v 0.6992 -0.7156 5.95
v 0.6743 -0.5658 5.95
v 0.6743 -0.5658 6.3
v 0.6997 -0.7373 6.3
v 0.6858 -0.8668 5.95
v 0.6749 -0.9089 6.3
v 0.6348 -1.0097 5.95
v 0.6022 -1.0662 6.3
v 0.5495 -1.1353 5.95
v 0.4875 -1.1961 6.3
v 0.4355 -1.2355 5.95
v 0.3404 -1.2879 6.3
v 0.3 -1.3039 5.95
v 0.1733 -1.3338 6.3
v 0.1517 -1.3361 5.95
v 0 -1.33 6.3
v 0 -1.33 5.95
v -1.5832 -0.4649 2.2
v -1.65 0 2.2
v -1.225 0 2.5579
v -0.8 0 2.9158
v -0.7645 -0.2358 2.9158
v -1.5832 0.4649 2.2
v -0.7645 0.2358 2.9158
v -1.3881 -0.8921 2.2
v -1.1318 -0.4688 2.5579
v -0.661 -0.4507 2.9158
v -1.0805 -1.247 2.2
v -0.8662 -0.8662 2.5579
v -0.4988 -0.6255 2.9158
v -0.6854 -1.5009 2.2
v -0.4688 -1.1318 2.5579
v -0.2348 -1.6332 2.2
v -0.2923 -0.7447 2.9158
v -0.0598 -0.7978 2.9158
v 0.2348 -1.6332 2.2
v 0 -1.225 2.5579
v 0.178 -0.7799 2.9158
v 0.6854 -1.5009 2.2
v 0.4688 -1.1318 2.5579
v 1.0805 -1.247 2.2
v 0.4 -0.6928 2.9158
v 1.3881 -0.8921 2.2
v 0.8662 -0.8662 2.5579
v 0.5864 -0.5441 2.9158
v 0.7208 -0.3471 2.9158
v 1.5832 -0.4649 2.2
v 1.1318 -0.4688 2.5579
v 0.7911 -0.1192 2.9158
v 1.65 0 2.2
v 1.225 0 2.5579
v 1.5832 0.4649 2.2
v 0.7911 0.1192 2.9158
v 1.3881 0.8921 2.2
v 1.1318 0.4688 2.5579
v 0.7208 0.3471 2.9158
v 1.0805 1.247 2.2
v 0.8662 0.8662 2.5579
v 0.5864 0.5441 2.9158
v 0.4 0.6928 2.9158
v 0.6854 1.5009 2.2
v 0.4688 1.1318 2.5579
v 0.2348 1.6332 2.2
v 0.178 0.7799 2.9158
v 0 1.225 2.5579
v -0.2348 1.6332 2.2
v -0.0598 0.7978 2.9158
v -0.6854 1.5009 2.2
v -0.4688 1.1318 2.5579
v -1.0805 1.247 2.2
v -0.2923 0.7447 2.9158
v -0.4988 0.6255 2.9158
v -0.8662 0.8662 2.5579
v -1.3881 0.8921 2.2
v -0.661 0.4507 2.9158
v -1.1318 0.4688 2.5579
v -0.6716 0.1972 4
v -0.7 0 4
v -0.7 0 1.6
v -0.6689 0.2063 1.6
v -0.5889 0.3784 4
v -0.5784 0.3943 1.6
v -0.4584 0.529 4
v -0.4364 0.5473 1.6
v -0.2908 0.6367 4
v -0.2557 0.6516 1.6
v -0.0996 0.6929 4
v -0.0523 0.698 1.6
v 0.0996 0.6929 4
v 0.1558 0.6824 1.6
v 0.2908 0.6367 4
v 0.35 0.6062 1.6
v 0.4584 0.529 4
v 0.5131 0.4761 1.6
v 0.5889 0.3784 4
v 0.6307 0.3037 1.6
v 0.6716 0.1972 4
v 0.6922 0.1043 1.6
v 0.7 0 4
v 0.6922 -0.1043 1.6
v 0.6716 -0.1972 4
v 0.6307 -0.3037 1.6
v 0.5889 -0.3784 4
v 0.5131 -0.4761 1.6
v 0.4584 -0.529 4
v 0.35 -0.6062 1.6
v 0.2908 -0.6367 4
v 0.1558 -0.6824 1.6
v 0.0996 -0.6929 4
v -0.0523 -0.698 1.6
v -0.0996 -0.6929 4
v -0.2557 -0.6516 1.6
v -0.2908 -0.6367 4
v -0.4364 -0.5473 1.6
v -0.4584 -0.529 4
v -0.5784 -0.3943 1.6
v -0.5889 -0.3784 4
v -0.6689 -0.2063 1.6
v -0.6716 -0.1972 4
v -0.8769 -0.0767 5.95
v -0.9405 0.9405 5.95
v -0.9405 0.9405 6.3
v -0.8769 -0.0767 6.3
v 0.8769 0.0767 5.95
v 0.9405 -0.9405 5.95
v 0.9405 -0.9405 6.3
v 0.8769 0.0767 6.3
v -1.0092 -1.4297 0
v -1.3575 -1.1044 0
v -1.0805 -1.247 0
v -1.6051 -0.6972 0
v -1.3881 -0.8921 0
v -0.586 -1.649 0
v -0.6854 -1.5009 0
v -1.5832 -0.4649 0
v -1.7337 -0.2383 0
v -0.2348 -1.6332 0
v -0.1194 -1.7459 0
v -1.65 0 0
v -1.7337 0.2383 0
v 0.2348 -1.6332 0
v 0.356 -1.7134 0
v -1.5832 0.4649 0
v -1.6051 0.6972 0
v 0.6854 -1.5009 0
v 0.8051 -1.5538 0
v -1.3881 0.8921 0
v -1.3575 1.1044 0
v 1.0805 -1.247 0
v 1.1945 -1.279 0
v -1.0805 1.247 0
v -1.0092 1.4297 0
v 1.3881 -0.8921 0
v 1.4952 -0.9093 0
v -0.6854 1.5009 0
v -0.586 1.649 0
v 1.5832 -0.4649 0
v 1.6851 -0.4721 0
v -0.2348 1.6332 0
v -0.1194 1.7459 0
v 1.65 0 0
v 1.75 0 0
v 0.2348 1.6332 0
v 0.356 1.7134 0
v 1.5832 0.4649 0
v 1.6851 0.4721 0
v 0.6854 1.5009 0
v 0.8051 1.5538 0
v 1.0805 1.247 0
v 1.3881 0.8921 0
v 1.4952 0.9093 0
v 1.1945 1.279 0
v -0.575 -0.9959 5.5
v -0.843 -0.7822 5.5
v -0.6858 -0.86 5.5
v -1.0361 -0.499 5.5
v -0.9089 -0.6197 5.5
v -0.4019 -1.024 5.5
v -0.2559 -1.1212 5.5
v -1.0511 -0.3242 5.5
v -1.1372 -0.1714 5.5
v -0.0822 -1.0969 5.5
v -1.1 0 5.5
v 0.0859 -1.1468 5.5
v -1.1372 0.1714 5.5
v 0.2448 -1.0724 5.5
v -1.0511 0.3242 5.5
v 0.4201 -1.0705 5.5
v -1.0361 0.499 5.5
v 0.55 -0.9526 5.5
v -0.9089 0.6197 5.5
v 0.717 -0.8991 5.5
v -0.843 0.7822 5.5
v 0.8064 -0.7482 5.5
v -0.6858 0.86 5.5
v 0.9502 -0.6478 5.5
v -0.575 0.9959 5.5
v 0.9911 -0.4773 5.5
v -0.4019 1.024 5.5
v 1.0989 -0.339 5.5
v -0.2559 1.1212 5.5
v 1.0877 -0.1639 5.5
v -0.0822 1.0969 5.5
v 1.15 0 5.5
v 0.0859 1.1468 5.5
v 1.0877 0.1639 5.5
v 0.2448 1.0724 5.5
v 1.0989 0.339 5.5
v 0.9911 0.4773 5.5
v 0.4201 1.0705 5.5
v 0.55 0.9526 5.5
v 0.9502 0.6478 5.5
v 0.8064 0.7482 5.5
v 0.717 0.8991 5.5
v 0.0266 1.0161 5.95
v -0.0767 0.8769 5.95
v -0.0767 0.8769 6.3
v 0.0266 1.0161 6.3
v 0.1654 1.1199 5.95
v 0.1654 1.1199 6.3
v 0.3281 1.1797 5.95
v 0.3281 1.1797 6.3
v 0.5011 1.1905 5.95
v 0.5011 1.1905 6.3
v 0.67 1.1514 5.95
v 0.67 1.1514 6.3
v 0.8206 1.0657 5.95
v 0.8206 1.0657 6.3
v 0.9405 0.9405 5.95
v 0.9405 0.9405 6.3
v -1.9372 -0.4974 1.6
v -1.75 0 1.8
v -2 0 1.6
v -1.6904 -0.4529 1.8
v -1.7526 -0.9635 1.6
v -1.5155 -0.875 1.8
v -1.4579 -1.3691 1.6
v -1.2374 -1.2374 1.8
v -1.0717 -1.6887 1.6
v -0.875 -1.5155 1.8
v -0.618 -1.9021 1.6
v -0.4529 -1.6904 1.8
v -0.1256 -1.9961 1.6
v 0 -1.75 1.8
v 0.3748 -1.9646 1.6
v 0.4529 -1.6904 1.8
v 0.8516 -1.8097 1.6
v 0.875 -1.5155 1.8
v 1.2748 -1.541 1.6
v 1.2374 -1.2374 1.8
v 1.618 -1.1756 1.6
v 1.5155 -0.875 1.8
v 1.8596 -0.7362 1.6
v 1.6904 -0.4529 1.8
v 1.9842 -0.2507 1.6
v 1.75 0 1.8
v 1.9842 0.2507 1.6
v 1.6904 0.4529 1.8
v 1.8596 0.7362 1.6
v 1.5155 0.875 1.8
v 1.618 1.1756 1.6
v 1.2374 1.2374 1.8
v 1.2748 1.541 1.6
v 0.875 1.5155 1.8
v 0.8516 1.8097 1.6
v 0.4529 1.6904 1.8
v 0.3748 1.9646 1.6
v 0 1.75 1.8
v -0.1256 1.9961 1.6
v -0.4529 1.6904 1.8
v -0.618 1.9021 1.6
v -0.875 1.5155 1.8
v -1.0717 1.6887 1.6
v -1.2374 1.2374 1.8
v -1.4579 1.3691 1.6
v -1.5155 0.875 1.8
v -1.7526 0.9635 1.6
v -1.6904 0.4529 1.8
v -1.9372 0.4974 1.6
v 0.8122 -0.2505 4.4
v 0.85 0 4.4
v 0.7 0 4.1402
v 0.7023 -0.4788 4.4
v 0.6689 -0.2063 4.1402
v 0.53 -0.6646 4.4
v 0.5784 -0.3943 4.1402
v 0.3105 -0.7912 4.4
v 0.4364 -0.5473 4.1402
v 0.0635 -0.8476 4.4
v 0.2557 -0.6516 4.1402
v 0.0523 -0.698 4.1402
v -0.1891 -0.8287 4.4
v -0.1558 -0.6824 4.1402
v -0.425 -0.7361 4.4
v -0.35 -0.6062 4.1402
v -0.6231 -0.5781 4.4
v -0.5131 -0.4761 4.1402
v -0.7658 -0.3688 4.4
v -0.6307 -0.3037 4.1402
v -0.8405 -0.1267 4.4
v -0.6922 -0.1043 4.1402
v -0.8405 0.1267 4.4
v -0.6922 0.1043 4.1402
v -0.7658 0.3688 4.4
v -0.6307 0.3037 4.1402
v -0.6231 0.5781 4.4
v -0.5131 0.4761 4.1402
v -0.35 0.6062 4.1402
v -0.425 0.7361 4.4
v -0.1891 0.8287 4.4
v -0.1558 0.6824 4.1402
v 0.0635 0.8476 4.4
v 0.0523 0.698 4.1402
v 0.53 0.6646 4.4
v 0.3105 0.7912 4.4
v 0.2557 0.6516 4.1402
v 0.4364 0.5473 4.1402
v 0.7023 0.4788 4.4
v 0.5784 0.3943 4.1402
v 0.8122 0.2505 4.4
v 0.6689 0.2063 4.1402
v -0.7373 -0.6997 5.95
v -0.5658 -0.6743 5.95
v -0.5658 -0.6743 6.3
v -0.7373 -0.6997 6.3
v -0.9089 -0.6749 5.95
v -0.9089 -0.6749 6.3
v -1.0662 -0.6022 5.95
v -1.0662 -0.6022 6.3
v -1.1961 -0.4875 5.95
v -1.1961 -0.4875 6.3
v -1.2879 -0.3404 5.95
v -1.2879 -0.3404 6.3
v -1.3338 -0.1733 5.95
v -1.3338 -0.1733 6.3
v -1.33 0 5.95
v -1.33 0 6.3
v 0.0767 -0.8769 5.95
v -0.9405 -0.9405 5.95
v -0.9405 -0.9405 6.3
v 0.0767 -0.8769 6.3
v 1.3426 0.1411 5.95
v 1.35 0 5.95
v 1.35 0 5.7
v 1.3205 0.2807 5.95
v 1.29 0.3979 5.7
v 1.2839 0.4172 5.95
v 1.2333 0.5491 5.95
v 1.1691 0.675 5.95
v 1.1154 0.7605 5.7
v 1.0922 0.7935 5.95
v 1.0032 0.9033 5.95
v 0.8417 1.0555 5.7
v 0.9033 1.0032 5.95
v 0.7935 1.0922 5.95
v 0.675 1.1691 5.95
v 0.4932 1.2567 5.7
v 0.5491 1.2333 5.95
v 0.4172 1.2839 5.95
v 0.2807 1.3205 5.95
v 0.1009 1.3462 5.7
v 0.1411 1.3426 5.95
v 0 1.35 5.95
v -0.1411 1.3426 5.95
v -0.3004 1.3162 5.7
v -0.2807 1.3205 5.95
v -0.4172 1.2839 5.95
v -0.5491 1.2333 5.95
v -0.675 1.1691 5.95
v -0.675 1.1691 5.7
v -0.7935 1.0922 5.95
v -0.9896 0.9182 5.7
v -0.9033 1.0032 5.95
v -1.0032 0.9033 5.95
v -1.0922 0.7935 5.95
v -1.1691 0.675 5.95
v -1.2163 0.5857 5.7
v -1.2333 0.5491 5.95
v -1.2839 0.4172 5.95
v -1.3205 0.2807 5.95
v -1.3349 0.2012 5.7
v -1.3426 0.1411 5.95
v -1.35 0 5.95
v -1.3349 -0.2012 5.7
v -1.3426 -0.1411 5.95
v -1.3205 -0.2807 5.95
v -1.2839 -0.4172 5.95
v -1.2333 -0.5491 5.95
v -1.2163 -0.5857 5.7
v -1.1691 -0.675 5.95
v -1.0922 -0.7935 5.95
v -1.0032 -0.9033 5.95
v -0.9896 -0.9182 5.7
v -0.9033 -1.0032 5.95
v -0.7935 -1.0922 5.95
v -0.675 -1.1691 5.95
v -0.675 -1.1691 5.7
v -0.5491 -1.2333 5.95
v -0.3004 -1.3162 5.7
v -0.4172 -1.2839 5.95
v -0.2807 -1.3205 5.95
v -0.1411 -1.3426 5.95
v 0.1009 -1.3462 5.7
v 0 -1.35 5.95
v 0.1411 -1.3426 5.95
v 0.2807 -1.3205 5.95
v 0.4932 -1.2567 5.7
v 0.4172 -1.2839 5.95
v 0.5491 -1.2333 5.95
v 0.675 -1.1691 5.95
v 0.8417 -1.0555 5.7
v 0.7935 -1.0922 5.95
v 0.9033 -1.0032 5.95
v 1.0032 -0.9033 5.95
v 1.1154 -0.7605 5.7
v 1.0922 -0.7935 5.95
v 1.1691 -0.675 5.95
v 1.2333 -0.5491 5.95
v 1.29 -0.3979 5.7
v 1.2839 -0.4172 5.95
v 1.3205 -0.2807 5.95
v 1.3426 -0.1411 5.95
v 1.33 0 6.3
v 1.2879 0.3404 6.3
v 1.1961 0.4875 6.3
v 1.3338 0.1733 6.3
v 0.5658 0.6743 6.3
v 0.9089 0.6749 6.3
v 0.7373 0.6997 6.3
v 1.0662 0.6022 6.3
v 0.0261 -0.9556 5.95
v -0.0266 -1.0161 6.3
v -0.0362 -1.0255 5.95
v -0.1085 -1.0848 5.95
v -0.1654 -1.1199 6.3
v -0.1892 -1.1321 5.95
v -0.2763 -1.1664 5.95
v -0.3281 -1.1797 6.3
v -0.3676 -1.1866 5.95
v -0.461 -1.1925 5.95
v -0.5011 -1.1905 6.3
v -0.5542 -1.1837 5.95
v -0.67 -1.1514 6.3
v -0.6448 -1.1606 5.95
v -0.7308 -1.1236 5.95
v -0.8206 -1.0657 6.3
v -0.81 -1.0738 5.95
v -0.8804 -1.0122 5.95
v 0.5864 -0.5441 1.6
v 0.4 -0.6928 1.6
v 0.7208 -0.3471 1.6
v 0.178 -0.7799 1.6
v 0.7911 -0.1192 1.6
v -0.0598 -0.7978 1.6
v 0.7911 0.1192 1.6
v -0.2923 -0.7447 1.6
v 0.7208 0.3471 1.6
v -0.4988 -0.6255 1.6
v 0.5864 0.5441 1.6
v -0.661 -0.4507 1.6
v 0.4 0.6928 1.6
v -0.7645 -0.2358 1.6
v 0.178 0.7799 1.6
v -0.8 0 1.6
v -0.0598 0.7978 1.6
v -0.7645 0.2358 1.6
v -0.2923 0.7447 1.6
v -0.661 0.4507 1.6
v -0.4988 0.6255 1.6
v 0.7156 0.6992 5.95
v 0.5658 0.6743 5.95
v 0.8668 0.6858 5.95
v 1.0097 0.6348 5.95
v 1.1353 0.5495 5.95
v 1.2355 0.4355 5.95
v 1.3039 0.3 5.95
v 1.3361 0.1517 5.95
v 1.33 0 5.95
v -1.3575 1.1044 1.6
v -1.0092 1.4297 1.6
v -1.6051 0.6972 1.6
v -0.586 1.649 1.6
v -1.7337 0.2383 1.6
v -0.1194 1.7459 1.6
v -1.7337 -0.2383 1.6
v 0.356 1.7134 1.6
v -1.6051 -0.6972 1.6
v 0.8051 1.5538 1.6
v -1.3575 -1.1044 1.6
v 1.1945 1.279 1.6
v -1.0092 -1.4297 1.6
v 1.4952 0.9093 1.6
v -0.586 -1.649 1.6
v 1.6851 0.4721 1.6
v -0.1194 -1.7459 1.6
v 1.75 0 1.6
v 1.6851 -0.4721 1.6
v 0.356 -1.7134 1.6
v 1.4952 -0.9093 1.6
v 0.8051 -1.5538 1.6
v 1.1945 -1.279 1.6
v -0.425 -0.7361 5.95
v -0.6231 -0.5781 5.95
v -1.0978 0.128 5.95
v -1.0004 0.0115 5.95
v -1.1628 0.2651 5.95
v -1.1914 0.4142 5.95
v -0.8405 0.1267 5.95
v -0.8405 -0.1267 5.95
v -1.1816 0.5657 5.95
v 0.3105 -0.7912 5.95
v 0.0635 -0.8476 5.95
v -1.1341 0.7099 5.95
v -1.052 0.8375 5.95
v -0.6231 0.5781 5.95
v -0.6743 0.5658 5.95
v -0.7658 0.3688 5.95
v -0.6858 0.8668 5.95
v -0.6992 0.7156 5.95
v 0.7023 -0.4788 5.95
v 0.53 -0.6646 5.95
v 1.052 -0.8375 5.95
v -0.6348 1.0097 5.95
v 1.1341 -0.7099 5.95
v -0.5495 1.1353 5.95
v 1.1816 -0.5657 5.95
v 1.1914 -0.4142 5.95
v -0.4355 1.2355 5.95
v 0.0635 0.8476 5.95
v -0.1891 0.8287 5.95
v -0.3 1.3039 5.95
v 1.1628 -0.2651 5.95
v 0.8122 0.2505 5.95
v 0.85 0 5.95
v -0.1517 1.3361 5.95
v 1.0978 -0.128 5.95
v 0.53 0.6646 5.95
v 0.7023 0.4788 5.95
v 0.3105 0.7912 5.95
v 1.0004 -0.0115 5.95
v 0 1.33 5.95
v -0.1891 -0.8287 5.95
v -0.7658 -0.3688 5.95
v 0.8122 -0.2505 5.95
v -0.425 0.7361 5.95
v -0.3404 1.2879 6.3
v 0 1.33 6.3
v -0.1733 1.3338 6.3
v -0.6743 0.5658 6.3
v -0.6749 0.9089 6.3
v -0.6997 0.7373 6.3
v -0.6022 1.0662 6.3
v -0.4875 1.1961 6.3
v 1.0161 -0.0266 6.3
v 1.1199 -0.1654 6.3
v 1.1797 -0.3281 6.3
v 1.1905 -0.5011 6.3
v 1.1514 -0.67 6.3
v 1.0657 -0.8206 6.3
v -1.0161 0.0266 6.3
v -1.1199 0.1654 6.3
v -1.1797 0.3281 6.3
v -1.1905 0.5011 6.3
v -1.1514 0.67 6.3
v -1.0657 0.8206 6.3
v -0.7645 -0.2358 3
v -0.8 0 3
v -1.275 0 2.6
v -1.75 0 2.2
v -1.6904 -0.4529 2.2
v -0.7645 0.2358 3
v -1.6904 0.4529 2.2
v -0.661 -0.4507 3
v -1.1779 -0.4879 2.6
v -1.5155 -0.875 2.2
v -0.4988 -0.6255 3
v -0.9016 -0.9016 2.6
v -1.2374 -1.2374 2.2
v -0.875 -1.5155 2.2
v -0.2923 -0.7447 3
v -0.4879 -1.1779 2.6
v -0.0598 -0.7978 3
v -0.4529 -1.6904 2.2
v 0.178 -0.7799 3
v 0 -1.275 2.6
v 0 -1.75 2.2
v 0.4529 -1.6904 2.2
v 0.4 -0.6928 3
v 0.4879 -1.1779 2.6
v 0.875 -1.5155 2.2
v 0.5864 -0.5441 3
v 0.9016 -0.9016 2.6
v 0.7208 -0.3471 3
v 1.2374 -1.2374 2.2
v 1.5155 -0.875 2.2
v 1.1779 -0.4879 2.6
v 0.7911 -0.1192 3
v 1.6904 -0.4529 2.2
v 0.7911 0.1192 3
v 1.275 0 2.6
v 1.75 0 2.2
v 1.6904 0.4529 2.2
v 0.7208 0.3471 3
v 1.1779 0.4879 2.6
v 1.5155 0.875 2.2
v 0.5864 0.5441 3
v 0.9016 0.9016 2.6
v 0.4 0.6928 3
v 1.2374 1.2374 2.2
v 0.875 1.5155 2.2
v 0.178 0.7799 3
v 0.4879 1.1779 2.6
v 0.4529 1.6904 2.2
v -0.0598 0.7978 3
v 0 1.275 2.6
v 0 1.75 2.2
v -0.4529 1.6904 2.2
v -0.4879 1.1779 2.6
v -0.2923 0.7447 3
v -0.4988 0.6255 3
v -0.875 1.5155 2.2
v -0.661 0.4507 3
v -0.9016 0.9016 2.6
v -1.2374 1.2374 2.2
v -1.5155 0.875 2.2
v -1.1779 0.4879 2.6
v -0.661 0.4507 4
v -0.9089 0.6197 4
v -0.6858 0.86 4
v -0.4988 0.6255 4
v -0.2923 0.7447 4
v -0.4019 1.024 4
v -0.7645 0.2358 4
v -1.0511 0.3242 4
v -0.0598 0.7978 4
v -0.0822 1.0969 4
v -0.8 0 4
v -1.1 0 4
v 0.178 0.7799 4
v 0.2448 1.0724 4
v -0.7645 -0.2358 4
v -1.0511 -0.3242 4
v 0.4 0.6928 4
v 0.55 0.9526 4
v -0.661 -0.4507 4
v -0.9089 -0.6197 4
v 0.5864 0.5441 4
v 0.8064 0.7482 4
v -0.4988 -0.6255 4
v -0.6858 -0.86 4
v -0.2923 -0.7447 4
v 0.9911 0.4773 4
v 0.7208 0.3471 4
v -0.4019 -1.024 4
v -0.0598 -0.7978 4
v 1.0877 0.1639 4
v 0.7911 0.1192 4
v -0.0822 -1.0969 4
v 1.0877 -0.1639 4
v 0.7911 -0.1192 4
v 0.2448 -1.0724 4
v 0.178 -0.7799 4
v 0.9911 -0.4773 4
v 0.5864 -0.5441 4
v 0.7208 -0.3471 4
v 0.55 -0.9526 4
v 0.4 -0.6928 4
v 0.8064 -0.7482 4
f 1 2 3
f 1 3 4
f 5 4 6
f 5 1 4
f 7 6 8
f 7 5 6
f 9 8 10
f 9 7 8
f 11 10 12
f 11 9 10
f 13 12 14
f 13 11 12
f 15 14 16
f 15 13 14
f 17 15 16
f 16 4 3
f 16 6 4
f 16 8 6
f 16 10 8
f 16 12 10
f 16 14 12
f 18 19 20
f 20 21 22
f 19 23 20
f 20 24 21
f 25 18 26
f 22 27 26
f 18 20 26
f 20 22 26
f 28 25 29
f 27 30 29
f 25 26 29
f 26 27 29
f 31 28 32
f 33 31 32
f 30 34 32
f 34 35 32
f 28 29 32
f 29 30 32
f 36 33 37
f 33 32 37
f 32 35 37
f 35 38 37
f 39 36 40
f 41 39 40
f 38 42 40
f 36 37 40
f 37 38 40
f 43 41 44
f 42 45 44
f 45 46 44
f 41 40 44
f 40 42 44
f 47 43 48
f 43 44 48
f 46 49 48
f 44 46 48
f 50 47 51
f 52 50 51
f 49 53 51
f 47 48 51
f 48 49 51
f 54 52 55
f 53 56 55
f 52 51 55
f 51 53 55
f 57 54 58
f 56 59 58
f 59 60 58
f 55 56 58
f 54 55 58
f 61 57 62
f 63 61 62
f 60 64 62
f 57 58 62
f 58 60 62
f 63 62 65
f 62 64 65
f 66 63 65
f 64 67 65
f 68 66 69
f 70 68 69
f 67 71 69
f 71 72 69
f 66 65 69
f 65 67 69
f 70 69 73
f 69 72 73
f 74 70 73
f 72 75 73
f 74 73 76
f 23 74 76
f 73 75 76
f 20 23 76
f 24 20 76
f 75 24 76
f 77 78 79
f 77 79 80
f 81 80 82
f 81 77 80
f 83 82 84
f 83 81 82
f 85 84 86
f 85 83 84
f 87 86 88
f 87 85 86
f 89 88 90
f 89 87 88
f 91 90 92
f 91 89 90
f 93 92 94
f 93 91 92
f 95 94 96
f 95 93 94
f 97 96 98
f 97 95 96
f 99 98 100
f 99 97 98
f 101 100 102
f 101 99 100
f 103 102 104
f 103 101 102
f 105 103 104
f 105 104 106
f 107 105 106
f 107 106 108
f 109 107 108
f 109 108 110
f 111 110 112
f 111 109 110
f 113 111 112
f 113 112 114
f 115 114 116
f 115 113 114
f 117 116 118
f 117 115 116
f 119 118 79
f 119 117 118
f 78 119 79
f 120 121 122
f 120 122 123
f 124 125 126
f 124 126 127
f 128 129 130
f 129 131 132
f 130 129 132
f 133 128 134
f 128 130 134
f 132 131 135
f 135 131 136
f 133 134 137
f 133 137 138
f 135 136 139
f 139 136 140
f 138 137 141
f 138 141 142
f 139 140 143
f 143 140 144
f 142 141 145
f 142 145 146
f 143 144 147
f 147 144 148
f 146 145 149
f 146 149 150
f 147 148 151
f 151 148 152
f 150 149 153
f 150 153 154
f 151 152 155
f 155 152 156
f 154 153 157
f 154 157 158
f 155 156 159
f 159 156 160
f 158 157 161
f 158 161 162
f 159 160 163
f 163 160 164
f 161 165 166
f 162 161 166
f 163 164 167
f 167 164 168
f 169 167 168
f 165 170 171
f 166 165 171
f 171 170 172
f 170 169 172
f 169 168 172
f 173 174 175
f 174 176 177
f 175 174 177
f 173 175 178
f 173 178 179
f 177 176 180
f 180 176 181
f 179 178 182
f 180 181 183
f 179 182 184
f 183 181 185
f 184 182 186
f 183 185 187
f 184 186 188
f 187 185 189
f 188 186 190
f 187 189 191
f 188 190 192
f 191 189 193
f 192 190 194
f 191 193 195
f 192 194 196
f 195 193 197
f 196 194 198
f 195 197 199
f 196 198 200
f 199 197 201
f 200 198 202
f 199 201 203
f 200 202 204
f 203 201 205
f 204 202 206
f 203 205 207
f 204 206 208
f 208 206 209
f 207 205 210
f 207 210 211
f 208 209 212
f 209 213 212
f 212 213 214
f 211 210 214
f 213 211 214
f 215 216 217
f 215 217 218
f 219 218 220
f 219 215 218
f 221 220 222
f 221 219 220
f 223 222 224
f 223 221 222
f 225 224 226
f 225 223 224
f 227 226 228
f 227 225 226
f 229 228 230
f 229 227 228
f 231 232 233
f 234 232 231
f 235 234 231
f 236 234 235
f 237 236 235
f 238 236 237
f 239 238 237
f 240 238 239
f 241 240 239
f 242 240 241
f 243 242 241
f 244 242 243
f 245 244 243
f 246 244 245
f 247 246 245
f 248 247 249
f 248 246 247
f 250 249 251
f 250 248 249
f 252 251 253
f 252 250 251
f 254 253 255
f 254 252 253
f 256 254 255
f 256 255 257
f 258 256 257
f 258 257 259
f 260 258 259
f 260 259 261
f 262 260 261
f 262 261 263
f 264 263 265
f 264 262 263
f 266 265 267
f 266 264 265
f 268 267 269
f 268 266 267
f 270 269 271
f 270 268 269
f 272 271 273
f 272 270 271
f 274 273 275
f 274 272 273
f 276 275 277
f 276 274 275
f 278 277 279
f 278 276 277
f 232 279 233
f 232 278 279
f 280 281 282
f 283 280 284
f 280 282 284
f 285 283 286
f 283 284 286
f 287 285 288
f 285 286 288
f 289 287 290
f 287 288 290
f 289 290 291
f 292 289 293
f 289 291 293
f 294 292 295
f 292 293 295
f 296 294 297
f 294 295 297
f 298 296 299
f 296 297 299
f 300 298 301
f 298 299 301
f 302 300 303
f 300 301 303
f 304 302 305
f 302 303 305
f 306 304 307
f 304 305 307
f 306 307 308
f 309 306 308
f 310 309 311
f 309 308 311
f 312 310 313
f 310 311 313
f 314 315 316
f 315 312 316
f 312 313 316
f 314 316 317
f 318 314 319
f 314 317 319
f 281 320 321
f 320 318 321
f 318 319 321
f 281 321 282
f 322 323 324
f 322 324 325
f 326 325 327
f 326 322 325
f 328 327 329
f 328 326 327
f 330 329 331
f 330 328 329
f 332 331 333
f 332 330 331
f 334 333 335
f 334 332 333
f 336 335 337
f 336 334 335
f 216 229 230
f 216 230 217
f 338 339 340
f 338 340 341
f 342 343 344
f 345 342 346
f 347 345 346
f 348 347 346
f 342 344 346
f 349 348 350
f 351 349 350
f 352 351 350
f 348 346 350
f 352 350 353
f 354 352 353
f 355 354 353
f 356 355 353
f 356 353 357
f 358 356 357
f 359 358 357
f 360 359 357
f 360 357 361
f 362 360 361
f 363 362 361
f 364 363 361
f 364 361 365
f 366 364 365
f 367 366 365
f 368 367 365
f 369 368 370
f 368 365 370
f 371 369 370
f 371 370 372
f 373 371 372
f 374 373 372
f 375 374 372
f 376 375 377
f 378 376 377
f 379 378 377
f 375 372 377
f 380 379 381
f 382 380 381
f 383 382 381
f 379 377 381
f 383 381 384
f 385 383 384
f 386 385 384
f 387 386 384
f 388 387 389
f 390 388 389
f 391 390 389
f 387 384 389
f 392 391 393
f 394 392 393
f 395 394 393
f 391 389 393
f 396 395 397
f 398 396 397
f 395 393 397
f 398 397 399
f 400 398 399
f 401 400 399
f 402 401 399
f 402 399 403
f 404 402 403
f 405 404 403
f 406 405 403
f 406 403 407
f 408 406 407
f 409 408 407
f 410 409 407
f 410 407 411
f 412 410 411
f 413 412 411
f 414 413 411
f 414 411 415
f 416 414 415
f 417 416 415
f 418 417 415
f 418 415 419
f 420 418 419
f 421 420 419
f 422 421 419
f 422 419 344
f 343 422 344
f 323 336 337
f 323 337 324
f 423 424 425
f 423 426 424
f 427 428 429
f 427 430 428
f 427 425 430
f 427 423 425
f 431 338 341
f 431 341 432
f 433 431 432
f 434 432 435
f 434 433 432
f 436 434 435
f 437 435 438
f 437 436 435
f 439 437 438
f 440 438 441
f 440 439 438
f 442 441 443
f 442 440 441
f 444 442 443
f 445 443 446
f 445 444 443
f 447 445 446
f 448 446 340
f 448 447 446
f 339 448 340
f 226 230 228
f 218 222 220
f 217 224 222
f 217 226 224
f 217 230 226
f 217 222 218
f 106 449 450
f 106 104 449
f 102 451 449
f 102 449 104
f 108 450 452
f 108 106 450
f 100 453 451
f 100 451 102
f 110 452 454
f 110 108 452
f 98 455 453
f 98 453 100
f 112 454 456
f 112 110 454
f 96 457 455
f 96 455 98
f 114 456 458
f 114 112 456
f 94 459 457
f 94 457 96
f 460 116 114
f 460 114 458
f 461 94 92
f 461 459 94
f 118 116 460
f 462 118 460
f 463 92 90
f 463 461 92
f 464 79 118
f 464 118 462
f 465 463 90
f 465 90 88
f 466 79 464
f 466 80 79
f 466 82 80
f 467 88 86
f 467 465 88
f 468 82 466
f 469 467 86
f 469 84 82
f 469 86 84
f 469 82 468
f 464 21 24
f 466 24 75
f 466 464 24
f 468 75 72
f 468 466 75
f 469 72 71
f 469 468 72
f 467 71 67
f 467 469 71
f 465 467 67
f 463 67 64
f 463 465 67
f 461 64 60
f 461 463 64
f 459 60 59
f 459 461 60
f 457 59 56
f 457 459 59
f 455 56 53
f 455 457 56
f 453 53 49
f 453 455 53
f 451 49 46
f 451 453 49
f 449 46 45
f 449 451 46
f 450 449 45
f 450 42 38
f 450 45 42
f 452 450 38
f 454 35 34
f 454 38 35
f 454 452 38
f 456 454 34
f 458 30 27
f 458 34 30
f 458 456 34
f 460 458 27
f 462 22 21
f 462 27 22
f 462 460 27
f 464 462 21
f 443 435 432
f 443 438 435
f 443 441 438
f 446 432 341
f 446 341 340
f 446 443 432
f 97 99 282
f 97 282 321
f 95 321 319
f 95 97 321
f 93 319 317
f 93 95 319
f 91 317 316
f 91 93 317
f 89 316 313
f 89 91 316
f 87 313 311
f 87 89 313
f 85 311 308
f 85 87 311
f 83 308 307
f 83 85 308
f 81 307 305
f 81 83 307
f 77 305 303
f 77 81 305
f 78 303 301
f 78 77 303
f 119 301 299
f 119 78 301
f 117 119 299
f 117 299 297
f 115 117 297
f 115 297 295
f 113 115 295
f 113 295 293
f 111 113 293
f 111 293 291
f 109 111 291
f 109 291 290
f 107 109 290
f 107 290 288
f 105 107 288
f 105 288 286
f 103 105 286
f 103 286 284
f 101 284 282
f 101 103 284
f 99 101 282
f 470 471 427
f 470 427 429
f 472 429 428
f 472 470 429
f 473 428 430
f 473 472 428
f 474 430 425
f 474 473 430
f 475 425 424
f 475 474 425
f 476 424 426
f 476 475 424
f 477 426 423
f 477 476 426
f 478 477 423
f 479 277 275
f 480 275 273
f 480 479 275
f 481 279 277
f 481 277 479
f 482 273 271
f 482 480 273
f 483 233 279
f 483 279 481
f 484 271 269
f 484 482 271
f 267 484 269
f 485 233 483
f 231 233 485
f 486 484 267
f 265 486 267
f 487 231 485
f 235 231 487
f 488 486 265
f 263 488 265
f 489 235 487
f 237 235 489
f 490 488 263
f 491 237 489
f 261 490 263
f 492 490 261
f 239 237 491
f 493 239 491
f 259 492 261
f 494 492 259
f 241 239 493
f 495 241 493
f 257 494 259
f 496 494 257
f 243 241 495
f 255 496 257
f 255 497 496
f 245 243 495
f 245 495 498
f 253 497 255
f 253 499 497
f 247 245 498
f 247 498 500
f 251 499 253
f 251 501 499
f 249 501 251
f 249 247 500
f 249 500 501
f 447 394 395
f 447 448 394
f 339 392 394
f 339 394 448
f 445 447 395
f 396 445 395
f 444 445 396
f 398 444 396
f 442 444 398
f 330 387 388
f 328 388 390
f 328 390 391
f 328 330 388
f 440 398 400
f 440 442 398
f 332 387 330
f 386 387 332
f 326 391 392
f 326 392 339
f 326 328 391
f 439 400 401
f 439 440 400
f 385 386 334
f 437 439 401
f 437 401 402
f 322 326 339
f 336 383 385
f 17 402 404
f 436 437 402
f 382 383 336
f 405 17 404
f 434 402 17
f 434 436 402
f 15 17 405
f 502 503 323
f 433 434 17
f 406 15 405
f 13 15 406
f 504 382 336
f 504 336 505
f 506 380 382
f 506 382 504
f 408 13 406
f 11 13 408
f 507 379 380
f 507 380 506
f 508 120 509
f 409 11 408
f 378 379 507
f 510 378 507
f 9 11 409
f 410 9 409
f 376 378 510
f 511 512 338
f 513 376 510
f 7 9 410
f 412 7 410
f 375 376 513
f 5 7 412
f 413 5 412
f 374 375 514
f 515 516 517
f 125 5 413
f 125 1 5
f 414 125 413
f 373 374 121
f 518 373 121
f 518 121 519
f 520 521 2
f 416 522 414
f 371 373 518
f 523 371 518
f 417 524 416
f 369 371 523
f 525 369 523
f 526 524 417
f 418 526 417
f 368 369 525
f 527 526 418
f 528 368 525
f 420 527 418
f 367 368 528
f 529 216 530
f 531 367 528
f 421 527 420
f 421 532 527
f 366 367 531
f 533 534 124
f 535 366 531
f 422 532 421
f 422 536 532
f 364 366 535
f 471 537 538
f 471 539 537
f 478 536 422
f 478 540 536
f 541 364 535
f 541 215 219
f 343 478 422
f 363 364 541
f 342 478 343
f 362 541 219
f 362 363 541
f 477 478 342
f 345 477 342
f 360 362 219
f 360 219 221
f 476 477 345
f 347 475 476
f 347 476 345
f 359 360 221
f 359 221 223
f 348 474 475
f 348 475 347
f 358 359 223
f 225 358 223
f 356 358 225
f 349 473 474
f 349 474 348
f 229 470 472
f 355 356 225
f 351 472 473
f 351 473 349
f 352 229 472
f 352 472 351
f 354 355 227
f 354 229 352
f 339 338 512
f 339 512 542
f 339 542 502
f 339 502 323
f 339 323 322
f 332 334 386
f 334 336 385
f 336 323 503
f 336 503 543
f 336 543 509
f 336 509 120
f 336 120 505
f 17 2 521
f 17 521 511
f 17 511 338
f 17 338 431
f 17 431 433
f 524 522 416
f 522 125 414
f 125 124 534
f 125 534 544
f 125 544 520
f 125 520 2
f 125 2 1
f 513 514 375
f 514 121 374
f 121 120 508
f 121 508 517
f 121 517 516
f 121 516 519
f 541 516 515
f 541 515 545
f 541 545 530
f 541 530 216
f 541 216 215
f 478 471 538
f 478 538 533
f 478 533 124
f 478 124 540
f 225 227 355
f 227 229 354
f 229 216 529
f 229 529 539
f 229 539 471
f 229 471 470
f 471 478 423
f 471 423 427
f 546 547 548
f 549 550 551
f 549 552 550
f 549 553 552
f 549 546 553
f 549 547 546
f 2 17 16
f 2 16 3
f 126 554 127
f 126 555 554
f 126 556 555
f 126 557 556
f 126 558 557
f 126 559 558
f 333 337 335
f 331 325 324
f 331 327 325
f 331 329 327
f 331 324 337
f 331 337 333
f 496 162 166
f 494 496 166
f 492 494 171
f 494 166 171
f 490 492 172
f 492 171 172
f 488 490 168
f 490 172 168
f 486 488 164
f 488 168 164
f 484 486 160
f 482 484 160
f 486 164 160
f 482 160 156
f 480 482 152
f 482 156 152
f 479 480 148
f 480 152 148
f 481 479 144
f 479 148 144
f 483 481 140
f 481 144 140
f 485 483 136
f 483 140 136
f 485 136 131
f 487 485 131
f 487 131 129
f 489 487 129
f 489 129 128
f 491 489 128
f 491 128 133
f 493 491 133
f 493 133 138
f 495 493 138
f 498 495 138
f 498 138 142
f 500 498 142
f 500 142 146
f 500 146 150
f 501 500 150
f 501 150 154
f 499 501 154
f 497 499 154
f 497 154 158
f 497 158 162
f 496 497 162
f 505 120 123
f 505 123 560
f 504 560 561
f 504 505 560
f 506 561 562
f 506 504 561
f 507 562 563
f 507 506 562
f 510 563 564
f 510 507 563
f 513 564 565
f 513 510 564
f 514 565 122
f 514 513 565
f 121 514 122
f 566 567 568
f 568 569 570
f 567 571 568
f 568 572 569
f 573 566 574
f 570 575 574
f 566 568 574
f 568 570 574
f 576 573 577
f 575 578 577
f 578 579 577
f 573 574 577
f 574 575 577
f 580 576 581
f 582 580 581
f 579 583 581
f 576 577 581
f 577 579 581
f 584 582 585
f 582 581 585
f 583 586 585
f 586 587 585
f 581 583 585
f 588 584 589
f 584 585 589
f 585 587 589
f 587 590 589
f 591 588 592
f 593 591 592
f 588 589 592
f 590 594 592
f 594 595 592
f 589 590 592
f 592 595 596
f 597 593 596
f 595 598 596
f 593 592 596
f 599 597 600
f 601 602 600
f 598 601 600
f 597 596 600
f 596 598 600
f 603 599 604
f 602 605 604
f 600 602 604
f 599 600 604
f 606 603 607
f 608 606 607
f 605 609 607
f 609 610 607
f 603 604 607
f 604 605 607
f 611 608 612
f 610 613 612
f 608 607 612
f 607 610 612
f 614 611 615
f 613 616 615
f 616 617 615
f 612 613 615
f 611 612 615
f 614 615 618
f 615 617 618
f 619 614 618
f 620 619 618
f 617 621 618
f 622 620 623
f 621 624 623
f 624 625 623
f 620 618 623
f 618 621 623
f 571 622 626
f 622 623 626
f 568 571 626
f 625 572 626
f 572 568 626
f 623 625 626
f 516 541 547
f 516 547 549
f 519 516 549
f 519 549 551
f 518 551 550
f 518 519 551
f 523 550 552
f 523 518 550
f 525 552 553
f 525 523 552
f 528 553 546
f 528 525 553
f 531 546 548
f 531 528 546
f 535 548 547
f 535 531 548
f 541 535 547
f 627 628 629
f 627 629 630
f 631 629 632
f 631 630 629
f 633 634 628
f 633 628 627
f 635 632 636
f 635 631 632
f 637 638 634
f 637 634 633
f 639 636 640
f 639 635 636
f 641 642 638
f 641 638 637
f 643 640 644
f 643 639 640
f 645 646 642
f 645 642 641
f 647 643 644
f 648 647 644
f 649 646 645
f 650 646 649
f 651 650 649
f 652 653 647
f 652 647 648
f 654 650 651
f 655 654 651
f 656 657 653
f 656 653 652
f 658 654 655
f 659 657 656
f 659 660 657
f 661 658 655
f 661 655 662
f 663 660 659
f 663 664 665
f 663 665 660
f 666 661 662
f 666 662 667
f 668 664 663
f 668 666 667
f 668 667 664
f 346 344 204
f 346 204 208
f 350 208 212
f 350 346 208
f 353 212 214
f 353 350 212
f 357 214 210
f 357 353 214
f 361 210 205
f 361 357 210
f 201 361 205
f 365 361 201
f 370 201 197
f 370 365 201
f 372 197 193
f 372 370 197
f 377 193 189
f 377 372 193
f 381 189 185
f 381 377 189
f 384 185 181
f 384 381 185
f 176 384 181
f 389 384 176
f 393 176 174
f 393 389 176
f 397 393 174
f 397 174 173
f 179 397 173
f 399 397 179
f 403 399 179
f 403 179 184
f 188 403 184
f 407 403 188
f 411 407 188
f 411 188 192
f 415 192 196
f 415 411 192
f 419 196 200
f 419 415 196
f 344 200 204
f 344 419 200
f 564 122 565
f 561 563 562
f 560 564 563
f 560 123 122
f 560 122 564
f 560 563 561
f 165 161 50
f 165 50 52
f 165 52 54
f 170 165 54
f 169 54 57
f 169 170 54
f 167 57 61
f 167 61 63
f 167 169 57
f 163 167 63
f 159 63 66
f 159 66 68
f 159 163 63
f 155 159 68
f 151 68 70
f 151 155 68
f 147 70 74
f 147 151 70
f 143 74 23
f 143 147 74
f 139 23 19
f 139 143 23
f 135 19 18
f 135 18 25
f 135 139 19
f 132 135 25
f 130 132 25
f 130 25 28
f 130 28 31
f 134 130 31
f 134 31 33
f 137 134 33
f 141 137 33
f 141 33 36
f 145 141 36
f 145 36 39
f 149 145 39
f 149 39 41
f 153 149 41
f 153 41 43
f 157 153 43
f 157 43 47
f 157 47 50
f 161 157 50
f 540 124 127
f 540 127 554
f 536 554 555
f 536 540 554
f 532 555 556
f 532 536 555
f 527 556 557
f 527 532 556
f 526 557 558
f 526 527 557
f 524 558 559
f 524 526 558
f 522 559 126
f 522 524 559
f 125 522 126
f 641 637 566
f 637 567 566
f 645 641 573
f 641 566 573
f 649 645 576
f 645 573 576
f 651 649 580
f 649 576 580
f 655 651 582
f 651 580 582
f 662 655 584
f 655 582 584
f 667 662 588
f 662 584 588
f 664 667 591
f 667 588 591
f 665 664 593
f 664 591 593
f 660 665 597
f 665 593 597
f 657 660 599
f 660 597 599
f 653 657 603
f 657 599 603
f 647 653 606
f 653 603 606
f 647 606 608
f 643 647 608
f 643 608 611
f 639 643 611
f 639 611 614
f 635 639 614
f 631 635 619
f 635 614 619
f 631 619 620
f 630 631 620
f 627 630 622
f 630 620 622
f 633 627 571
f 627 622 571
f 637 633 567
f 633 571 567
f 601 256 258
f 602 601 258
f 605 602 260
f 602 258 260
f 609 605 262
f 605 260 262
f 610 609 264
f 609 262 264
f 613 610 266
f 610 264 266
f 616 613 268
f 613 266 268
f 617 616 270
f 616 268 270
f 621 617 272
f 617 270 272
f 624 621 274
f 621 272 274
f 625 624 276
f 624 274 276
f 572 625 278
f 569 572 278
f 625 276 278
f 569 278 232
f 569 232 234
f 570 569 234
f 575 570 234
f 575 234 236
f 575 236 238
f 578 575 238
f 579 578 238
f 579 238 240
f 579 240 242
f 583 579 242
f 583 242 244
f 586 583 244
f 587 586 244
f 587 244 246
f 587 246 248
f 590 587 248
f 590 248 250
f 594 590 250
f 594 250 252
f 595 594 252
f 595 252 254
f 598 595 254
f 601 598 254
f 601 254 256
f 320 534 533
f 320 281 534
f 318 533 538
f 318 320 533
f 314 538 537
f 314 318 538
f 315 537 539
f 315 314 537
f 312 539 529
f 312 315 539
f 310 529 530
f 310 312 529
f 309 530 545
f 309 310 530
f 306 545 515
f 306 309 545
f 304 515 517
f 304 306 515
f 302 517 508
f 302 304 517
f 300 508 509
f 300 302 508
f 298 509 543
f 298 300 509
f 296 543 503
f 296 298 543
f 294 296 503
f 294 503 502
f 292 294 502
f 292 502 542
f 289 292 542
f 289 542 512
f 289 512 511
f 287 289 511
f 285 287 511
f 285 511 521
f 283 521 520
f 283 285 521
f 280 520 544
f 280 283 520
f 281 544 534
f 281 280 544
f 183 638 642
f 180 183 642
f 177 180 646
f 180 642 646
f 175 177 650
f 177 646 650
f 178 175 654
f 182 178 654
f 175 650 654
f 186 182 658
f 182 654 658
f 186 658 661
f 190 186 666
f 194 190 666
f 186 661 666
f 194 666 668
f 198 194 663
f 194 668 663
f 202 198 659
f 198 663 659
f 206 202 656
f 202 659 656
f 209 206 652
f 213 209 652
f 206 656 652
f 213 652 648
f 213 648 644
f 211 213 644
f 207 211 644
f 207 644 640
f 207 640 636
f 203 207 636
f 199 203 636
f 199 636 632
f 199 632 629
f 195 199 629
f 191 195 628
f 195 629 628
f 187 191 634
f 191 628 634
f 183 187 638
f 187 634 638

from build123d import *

# Parameters (mm, degrees)
SKETCH_1_R          = 1.75
SKETCH_1_R_2        = 1.65
EXTRUDE_1_DEPTH     = 2.2
SKETCH_10_R         = 0.8
SKETCH_10_R_2       = 0.7
EXTRUDE_2_DEPTH     = 1.2
SKETCH_11_R         = 0.8
SKETCH_11_R_2       = 0.7
EXTRUDE_4_DEPTH     = 0.9
SKETCH_12_W         = 0.3
SKETCH_12_H         = 0.9
SKETCH_13_R         = 0.85
CUT_EXTRUDE_2_DEPTH = 0.5
CHAMFER_1_SIZE      = 0.15
CHAMFER_1_SIZE_2    = 0.259807621
SKETCH_14_R         = 1.1
SKETCH_14_R_2       = 0.85
EXTRUDE_5_DEPTH     = 0.6
SKETCH_15_R         = 1.35
SKETCH_15_R_2       = 1.1
EXTRUDE_6_DEPTH     = 0.8
SKETCH_17_R         = 1.1
SKETCH_17_R_2       = 0.85
EXTRUDE_7_DEPTH     = 0.8
CHAMFER_3_SIZE      = 0.2
CUT_EXTRUDE_START   = -0.35
SKETCH_20_R         = 1.35
SKETCH_20_R_2       = 0.85
CUT_EXTRUDE_4_DEPTH = 0.35


with BuildPart() as part:
    # 스케치1 → 보스-돌출1 (new body)
    with BuildSketch(Plane.XY):
        Circle(SKETCH_1_R)
        Circle(SKETCH_1_R_2, mode=Mode.SUBTRACT)
    extrude(amount=EXTRUDE_1_DEPTH)

    # 스케치2 → 회전1 (revolve)
    with BuildSketch(Plane(origin=(0, 0, 0), x_dir=(1, 0, 0), z_dir=(0, 1, 0)), mode=Mode.PRIVATE) as revolve_1_sk:
        Polygon((2, -1.6), (1.75, -1.8), (1.75, -1.6), align=None)
    revolve(revolve_1_sk.sketch.rotate(Axis((0, 0, 0), (0, 0, 1)), 180), axis=Axis((0, 0, 0), (0, 0, 1)))

    # 스케치3 → 회전2 (revolve)
    with BuildSketch(Plane(origin=(0, 0, 0), x_dir=(1, 0, 0), z_dir=(0, 1, 0)), mode=Mode.PRIVATE) as revolve_2_sk:
        Polygon((0.8, -3), (1.75, -2.2), (1.65, -2.2), (0.8, -2.915789474), align=None)
    revolve(revolve_2_sk.sketch.rotate(Axis((0, 0, 0), (0, 0, 1)), 180), axis=Axis((0, 0, 0), (0, 0, 1)))

    # 스케치10 → 보스-돌출2 (add, symmetric)
    with BuildSketch(Plane(origin=(0, 0, 2.8), x_dir=(-1, 0, 0), z_dir=(0, 0, -1))):
        Circle(SKETCH_10_R)
        Circle(SKETCH_10_R_2, mode=Mode.SUBTRACT)
    extrude(amount=EXTRUDE_2_DEPTH, both=True)

    # 스케치11 → 보스-돌출4 (add)
    with BuildSketch(Plane.XY.offset(4)):
        with Locations(Location((0, 0, 0), (0, 0, 180))):
            Circle(SKETCH_11_R)
        Circle(SKETCH_11_R_2, mode=Mode.SUBTRACT)
    extrude(amount=EXTRUDE_4_DEPTH)

    # 스케치12 → 회전3 (revolve)
    with BuildSketch(Plane(origin=(0, 0, 0), x_dir=(1, 0, 0), z_dir=(0, 1, 0)), mode=Mode.PRIVATE) as revolve_3_sk:
        with Locations((0.95, -4.45)):
            Rectangle(SKETCH_12_W, SKETCH_12_H)
    revolve(revolve_3_sk.sketch.rotate(Axis((0, 0, 0), (0, 0, 1)), 180), axis=Axis((0, 0, 0), (0, 0, 1)))

    # 스케치13 → 컷-돌출2 (cut)
    with BuildSketch(Plane.XY.offset(4.9)):
        Circle(SKETCH_13_R)
    extrude(amount=-CUT_EXTRUDE_2_DEPTH, mode=Mode.SUBTRACT)

    # 모따기1
    # the kernel refuses this chamfer: 0.259807621, 0.15 mm, written as the material it takes off along each edge
    with BuildSketch(Plane(origin=(0, 0, 4.4), x_dir=(1, 0, 0), z_dir=(0, 1, 0))) as chamfer_1_piece_1_section:
        Polygon((0.7 + CHAMFER_1_SIZE, 0), (0.7, CHAMFER_1_SIZE_2), (0.7, 0), align=None)
    chamfer_1_piece_1 = revolve(axis=Axis((0, 0, 4.4), (0, 0, -1)), mode=Mode.PRIVATE)
    chamfer_1_piece_1 = chamfer_1_piece_1 & Plane(origin=(0, 0, 4.267945413), x_dir=(1, 0, 0), z_dir=(0, 0, 1)) * Cylinder(0.85, 4, mode=Mode.PRIVATE)
    add(chamfer_1_piece_1, mode=Mode.SUBTRACT)

    # 스케치14 → 보스-돌출5 (add)
    with BuildSketch(Plane.XY.offset(4.9)):
        with Locations(Location((0, 0, 0), (0, 0, 180))):
            Circle(SKETCH_14_R)
        Circle(SKETCH_14_R_2, mode=Mode.SUBTRACT)
    extrude(amount=EXTRUDE_5_DEPTH)



with BuildPart() as body_2:
    # 스케치15 → 보스-돌출6 (new body)
    with BuildSketch(Plane.XY.offset(5.5)):
        Circle(SKETCH_15_R)
        with Locations(Location((0, 0, 0), (0, 0, 180))):
            Circle(SKETCH_15_R_2, mode=Mode.SUBTRACT)
    extrude(amount=EXTRUDE_6_DEPTH)


with BuildPart() as part_1:
    add(part.part)

    add(body_2.part)  # 보스-돌출7 merges body 2
    # 스케치17 → 보스-돌출7 (add)
    with BuildSketch(Plane.XY.offset(5.5)):
        with Locations(Location((0, 0, 0), (0, 0, 180))):
            Circle(SKETCH_17_R)
        Circle(SKETCH_17_R_2, mode=Mode.SUBTRACT)
    extrude(amount=EXTRUDE_7_DEPTH)

    # 모따기3
    chamfer_3_edges = [part_1.edges().sort_by_distance(p)[0] for p in [
        (-1.35, 0, 5.5),
    ]]
    chamfer(chamfer_3_edges, length=CHAMFER_3_SIZE)

    # 스케치20 → 컷-돌출4 (cut)
    with BuildSketch(Plane.XY.offset(6.3).offset(CUT_EXTRUDE_START)):
        Circle(SKETCH_20_R)
        Circle(SKETCH_20_R_2, mode=Mode.SUBTRACT)
        with BuildLine():
            Line((-0.940452019, -0.940452019), (0.076720819, -0.876922974))
            ThreePointArc((0.076720819, -0.876922974), (-0.414209233, -1.191386171), (-0.940452019, -0.940452019))
        make_face(mode=Mode.SUBTRACT)
        with BuildLine():
            Line((-1.33, 0), (-0.56582837, -0.674327993))
            ThreePointArc((-0.56582837, -0.674327993), (-1.135327398, -0.549547083), (-1.33, 0))
        make_face(mode=Mode.SUBTRACT)
        with BuildLine():
            Line((0, -1.33), (0.674327993, -0.56582837))
            ThreePointArc((0.674327993, -0.56582837), (0.549547083, -1.135327398), (0, -1.33))
        make_face(mode=Mode.SUBTRACT)
        with BuildLine():
            Line((0.940452019, -0.940452019), (0.876922974, 0.076720819))
            ThreePointArc((0.876922974, 0.076720819), (1.191386171, -0.414209233), (0.940452019, -0.940452019))
        make_face(mode=Mode.SUBTRACT)
        with BuildLine():
            Line((-0.940452019, 0.940452019), (-0.876922974, -0.076720819))
            ThreePointArc((-0.876922974, -0.076720819), (-1.191386171, 0.414209233), (-0.940452019, 0.940452019))
        make_face(mode=Mode.SUBTRACT)
        with BuildLine():
            ThreePointArc((-0.674327993, 0.56582837), (-0.549547083, 1.135327398), (0, 1.33))
            Line((0, 1.33), (-0.674327993, 0.56582837))
        make_face(mode=Mode.SUBTRACT)
        with BuildLine():
            Line((0.940452019, 0.940452019), (-0.076720819, 0.876922974))
            ThreePointArc((-0.076720819, 0.876922974), (0.414209233, 1.191386171), (0.940452019, 0.940452019))
        make_face(mode=Mode.SUBTRACT)
        with BuildLine():
            Line((1.33, 0), (0.56582837, 0.674327993))
            ThreePointArc((0.56582837, 0.674327993), (1.135327398, 0.549547083), (1.33, 0))
        make_face(mode=Mode.SUBTRACT)
    extrude(amount=CUT_EXTRUDE_4_DEPTH, mode=Mode.SUBTRACT)


solid = part_1.part
